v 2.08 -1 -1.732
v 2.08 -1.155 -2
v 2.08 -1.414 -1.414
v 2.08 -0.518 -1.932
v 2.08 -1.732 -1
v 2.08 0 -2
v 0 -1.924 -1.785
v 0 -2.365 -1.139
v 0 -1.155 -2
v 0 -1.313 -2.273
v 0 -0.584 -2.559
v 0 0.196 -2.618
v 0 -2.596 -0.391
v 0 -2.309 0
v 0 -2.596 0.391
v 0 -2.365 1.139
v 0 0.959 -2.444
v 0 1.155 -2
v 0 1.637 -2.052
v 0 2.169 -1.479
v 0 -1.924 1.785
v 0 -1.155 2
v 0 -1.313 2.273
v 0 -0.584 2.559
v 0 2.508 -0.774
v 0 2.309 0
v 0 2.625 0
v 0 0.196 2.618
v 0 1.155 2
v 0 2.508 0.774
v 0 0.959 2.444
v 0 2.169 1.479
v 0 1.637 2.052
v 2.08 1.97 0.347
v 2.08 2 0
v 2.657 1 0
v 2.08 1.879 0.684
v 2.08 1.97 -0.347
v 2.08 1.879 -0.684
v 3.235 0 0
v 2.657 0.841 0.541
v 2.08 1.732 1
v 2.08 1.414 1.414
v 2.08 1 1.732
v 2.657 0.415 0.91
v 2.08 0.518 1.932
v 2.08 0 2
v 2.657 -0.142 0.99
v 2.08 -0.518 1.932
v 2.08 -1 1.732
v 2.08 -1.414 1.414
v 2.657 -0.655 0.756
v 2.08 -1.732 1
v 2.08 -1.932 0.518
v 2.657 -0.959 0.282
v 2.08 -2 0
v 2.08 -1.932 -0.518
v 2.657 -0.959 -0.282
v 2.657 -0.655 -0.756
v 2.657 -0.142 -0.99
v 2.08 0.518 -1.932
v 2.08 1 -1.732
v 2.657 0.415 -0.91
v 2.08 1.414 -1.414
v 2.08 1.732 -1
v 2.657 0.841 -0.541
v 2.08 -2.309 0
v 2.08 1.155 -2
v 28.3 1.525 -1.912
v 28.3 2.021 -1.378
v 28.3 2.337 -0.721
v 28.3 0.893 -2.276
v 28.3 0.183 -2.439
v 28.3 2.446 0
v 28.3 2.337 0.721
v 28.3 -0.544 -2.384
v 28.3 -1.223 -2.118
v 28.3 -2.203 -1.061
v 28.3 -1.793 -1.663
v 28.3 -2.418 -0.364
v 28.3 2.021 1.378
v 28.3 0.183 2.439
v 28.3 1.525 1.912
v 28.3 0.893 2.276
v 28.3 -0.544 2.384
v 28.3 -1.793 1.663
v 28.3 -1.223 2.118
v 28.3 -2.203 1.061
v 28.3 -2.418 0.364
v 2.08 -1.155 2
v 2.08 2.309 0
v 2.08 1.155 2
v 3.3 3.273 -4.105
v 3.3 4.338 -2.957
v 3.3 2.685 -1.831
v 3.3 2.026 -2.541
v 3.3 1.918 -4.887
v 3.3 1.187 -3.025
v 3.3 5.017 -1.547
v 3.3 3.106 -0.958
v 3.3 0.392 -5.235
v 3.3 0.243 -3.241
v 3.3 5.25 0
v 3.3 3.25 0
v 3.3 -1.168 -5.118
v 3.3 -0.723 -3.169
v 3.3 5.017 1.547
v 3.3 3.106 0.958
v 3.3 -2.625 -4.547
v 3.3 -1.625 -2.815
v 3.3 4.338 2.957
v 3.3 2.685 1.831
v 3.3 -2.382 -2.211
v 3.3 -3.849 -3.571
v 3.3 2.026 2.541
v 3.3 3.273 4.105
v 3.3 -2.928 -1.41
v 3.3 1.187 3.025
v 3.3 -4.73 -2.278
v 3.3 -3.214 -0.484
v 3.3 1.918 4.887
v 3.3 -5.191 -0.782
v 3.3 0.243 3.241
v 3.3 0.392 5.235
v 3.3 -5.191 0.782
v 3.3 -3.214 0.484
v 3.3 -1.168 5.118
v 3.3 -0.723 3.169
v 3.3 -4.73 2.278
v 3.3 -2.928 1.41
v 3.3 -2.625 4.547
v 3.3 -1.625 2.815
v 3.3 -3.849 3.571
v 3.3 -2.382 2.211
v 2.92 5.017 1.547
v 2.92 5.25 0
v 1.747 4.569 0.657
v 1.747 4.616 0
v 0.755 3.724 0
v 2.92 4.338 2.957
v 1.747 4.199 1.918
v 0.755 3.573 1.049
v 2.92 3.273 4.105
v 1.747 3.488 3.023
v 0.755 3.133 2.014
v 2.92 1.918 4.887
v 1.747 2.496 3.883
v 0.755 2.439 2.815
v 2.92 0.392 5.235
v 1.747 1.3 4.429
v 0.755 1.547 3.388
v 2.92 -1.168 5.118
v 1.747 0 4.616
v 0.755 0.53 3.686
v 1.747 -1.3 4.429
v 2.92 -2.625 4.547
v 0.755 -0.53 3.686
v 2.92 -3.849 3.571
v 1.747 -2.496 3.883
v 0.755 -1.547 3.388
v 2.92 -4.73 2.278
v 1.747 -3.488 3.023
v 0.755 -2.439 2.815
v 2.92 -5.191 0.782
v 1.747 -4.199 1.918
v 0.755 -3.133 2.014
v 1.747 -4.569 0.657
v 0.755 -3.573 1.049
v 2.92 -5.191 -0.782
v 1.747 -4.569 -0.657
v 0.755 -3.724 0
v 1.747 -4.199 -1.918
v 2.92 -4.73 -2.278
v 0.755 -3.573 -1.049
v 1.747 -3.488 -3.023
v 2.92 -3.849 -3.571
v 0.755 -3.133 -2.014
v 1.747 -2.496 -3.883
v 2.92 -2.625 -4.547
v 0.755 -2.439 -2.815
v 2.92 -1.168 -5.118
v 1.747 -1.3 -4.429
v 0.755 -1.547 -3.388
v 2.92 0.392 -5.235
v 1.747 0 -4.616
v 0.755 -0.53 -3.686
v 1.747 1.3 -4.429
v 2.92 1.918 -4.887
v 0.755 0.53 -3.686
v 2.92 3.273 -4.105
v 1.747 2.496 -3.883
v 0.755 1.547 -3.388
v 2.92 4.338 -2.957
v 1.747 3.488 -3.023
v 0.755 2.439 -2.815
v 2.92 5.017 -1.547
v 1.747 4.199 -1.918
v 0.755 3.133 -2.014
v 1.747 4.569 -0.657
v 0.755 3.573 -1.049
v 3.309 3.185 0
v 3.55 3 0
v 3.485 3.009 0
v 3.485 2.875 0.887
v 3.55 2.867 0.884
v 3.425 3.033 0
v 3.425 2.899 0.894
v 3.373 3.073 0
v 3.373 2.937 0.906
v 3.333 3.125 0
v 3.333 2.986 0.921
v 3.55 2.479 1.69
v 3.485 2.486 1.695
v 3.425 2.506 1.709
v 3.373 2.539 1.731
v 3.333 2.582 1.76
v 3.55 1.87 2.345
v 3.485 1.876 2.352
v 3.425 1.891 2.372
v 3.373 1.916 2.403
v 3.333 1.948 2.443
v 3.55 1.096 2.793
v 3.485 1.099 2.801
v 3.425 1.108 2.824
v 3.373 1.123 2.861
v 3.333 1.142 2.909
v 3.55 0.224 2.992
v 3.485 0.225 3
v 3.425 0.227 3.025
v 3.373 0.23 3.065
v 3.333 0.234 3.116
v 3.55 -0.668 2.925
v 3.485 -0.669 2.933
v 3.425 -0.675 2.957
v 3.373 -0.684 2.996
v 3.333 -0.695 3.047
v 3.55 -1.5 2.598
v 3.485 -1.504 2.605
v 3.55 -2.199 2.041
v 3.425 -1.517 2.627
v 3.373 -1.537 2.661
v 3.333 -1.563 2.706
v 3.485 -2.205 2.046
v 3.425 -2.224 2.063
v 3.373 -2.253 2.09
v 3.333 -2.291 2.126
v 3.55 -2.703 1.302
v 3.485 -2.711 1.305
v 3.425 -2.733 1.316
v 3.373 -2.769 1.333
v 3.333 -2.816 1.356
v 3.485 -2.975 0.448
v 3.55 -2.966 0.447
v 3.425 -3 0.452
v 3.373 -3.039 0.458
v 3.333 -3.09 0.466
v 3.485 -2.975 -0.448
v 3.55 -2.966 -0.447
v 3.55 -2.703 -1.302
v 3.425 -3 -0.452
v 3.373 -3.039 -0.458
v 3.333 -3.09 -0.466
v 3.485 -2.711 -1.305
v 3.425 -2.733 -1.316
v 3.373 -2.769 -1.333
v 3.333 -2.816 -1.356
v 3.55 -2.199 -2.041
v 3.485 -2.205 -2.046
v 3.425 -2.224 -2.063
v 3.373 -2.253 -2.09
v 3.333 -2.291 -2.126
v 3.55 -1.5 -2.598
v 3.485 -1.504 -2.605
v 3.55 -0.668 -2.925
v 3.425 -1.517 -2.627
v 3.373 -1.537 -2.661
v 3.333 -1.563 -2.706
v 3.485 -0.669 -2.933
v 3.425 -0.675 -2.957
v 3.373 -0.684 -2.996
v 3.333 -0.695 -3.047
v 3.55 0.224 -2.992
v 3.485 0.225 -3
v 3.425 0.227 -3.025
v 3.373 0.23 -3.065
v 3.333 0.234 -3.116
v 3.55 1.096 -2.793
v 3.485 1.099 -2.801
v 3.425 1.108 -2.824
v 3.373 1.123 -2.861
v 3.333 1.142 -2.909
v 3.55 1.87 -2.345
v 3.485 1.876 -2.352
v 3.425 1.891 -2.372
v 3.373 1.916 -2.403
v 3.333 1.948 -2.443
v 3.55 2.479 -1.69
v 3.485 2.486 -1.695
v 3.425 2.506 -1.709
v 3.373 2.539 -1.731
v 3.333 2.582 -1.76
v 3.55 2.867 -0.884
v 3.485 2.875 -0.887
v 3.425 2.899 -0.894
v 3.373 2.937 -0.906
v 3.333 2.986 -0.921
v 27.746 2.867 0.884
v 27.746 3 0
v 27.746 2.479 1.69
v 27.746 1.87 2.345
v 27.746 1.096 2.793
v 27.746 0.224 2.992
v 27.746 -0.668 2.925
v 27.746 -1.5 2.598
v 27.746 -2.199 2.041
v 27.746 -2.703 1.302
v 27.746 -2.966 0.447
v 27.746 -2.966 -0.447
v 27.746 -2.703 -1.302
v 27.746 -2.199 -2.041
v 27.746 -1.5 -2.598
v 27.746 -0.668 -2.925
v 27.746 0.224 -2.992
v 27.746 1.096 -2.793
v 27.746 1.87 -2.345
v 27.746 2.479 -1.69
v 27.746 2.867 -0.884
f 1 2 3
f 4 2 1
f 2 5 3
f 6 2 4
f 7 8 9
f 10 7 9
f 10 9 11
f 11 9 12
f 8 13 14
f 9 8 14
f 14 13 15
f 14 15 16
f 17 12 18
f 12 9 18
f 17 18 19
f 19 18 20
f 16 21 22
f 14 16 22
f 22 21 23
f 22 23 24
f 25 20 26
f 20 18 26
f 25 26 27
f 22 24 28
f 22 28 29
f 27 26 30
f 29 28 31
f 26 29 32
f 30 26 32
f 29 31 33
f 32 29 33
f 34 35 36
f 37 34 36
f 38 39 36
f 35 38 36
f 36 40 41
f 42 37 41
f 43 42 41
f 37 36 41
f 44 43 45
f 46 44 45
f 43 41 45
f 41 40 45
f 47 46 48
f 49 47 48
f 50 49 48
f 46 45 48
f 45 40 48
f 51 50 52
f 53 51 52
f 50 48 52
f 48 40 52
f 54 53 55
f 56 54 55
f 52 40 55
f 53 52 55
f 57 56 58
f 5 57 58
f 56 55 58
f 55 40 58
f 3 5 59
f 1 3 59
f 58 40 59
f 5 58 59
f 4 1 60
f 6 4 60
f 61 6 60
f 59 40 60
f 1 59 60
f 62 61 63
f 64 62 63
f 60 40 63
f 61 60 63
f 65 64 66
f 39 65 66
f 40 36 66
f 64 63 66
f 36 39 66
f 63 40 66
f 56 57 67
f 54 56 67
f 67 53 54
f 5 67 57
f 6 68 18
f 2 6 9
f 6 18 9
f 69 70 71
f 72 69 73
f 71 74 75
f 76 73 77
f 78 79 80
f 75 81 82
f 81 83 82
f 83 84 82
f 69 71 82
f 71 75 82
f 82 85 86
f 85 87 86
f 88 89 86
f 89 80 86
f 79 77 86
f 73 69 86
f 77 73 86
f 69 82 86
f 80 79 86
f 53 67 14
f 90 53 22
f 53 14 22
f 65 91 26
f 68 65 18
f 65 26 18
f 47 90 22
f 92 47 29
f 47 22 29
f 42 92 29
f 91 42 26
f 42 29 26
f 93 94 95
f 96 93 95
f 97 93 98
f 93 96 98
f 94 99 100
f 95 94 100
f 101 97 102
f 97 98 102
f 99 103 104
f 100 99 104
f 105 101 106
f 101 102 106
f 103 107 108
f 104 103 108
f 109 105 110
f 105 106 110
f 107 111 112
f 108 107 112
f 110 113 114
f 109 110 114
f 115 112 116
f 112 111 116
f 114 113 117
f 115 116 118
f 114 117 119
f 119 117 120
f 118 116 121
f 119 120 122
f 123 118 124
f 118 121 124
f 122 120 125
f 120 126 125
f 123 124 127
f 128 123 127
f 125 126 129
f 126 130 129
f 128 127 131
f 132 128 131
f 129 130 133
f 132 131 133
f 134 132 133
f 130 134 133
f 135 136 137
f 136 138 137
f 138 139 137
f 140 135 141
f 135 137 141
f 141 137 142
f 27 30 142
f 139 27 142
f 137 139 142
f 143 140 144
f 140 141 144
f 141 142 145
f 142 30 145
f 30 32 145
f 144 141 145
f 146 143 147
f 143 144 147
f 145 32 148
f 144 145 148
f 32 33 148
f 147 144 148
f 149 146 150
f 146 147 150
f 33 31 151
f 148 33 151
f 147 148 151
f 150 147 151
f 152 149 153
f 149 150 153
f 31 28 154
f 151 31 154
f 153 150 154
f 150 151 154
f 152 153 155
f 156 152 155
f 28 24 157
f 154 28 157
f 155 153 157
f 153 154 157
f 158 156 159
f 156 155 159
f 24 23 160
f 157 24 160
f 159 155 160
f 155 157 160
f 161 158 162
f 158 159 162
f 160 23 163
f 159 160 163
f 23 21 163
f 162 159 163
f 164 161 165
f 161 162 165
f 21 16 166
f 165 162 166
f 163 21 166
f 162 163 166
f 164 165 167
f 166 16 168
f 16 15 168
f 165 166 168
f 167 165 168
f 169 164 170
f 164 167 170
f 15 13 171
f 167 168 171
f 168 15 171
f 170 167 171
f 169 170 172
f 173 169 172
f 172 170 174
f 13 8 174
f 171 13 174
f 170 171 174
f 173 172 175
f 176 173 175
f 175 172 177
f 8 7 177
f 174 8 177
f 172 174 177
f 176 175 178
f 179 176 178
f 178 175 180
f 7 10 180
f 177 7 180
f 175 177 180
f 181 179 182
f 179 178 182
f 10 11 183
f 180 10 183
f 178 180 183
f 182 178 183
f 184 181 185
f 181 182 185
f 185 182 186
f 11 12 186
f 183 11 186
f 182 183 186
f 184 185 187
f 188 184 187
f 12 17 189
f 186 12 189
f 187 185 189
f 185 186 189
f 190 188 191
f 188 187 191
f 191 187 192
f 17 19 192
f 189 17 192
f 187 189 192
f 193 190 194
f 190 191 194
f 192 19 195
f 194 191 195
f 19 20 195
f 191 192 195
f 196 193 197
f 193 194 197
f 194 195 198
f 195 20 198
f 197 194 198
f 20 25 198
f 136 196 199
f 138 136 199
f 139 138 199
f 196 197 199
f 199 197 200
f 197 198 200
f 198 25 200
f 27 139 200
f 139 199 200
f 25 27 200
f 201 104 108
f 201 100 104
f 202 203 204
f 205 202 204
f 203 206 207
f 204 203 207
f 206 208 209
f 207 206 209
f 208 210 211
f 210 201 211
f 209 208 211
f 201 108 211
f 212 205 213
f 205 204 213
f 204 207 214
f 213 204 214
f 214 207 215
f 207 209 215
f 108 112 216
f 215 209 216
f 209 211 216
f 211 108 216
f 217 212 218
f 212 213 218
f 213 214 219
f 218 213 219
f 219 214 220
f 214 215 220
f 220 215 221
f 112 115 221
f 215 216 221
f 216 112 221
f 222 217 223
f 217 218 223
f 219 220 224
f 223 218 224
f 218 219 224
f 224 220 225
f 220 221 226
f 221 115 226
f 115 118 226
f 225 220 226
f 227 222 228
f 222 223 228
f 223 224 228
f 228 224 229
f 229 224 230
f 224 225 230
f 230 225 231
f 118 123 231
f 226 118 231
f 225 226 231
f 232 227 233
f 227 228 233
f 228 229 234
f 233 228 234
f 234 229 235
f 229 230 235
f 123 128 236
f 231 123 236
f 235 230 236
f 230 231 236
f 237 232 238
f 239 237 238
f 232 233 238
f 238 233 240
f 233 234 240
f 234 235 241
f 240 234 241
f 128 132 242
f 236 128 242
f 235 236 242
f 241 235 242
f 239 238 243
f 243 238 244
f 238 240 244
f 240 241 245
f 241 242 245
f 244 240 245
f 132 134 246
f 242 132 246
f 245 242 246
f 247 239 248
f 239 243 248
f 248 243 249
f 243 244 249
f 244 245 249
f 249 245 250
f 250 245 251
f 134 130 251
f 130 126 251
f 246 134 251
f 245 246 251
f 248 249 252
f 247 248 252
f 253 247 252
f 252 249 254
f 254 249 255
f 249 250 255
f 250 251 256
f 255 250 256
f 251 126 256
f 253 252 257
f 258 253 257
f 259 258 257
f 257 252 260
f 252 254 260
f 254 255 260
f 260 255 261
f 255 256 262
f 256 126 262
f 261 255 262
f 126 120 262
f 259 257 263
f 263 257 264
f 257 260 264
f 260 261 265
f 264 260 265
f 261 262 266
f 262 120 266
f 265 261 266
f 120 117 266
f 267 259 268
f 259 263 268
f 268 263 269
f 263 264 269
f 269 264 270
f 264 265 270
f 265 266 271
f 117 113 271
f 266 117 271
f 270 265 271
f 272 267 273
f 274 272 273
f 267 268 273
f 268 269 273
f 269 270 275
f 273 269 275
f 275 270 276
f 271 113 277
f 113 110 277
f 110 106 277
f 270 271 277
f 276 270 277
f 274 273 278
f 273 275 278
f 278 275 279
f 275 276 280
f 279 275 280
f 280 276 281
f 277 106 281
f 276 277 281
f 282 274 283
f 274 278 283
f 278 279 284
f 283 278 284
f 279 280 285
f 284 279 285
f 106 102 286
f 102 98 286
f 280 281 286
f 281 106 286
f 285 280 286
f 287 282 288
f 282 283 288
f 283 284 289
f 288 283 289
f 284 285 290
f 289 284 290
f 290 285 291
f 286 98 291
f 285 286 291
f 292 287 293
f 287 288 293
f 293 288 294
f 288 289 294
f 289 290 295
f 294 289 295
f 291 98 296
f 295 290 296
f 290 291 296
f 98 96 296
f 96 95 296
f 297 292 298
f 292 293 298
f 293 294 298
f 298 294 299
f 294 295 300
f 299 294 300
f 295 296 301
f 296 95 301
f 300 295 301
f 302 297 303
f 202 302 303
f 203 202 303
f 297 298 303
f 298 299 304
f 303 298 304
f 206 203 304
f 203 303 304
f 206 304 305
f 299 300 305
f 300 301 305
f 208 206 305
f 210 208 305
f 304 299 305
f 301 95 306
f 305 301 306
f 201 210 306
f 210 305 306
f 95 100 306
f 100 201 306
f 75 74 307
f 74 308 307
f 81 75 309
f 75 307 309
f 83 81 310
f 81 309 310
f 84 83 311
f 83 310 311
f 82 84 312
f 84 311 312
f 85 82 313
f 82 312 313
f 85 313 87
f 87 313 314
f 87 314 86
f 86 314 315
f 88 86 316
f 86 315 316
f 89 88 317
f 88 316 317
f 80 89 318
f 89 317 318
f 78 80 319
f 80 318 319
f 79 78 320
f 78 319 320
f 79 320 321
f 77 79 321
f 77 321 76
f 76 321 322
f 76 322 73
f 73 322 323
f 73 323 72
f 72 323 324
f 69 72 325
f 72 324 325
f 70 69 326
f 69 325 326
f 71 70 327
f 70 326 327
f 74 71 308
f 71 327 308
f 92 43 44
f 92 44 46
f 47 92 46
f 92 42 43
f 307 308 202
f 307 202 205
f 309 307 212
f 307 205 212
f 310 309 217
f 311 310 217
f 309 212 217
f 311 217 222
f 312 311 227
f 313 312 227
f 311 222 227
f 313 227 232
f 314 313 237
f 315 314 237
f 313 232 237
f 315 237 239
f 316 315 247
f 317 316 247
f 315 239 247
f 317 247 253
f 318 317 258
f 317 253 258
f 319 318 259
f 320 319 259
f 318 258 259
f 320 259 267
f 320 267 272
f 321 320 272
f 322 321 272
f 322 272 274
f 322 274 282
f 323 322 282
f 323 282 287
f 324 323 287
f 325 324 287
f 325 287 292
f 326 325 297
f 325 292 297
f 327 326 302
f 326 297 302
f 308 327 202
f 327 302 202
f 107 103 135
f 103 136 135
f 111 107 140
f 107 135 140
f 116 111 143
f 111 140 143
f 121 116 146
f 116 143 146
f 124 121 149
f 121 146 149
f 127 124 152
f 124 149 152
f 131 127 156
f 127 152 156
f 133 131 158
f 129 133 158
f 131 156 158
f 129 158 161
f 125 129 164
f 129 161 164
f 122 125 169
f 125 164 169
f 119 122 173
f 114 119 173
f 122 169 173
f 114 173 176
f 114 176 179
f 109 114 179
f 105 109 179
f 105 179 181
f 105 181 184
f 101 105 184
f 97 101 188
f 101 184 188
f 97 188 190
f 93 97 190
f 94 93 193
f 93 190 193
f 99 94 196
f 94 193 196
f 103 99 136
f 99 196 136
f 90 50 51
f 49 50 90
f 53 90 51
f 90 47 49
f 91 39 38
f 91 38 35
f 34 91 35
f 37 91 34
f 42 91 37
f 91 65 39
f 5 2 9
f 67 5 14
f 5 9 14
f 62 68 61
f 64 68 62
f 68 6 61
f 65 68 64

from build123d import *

# Parameters (mm, degrees)
FILLET1_R   = 0.25
HEX_2_DEPTH = 2.08


with BuildPart() as part:
    # BodySke → BaseBody (revolve)
    with BuildSketch(Plane.XY):
        with BuildLine():
            Line((28.3, 0), (28.3, 2.4455))
            Line((28.3, 2.4455), (27.7455, 3))
            Line((27.7455, 3), (3.3, 3))
            Line((3.3, 3), (3.3, 5.25))
            Line((3.3, 5.25), (2.92, 5.25))
            ThreePointArc((2.92, 5.25), (1.224500646, 4.199464996), (0, 2.625))
            Line((0, 2.625), (0, 0))
            Line((0, 0), (28.3, 0))
        make_face()
    revolve(axis=Axis((0, 0, 0), (1, 0, 0)))

    # Fillet1
    fillet1_edges = [part.edges().sort_by_distance(p)[0] for p in [
        (3.3, -3, 0),
    ]]
    fillet(fillet1_edges, radius=FILLET1_R)

    # Sketch2 → PreBroach (revolve, cut)
    with BuildSketch(Plane.XY):
        Polygon((0, 2), (2.08, 2), (3.234700538, 0), (0, 0), align=None)
    revolve(axis=Axis((0, 0, 0), (1, 0, 0)), mode=Mode.SUBTRACT)

    # Sketch3 → Hex 2 (cut)
    with BuildSketch(Plane(origin=(0, 0, 0), x_dir=(0, 0, -1), z_dir=(1, 0, 0))):
        Polygon((-2, -1.154700538), (-2, 1.154700538), (0, 2.309401077), (2, 1.154700538), (2, -1.154700538), (0, -2.309401077), align=None)
    extrude(amount=HEX_2_DEPTH, mode=Mode.SUBTRACT)


solid = part.part
